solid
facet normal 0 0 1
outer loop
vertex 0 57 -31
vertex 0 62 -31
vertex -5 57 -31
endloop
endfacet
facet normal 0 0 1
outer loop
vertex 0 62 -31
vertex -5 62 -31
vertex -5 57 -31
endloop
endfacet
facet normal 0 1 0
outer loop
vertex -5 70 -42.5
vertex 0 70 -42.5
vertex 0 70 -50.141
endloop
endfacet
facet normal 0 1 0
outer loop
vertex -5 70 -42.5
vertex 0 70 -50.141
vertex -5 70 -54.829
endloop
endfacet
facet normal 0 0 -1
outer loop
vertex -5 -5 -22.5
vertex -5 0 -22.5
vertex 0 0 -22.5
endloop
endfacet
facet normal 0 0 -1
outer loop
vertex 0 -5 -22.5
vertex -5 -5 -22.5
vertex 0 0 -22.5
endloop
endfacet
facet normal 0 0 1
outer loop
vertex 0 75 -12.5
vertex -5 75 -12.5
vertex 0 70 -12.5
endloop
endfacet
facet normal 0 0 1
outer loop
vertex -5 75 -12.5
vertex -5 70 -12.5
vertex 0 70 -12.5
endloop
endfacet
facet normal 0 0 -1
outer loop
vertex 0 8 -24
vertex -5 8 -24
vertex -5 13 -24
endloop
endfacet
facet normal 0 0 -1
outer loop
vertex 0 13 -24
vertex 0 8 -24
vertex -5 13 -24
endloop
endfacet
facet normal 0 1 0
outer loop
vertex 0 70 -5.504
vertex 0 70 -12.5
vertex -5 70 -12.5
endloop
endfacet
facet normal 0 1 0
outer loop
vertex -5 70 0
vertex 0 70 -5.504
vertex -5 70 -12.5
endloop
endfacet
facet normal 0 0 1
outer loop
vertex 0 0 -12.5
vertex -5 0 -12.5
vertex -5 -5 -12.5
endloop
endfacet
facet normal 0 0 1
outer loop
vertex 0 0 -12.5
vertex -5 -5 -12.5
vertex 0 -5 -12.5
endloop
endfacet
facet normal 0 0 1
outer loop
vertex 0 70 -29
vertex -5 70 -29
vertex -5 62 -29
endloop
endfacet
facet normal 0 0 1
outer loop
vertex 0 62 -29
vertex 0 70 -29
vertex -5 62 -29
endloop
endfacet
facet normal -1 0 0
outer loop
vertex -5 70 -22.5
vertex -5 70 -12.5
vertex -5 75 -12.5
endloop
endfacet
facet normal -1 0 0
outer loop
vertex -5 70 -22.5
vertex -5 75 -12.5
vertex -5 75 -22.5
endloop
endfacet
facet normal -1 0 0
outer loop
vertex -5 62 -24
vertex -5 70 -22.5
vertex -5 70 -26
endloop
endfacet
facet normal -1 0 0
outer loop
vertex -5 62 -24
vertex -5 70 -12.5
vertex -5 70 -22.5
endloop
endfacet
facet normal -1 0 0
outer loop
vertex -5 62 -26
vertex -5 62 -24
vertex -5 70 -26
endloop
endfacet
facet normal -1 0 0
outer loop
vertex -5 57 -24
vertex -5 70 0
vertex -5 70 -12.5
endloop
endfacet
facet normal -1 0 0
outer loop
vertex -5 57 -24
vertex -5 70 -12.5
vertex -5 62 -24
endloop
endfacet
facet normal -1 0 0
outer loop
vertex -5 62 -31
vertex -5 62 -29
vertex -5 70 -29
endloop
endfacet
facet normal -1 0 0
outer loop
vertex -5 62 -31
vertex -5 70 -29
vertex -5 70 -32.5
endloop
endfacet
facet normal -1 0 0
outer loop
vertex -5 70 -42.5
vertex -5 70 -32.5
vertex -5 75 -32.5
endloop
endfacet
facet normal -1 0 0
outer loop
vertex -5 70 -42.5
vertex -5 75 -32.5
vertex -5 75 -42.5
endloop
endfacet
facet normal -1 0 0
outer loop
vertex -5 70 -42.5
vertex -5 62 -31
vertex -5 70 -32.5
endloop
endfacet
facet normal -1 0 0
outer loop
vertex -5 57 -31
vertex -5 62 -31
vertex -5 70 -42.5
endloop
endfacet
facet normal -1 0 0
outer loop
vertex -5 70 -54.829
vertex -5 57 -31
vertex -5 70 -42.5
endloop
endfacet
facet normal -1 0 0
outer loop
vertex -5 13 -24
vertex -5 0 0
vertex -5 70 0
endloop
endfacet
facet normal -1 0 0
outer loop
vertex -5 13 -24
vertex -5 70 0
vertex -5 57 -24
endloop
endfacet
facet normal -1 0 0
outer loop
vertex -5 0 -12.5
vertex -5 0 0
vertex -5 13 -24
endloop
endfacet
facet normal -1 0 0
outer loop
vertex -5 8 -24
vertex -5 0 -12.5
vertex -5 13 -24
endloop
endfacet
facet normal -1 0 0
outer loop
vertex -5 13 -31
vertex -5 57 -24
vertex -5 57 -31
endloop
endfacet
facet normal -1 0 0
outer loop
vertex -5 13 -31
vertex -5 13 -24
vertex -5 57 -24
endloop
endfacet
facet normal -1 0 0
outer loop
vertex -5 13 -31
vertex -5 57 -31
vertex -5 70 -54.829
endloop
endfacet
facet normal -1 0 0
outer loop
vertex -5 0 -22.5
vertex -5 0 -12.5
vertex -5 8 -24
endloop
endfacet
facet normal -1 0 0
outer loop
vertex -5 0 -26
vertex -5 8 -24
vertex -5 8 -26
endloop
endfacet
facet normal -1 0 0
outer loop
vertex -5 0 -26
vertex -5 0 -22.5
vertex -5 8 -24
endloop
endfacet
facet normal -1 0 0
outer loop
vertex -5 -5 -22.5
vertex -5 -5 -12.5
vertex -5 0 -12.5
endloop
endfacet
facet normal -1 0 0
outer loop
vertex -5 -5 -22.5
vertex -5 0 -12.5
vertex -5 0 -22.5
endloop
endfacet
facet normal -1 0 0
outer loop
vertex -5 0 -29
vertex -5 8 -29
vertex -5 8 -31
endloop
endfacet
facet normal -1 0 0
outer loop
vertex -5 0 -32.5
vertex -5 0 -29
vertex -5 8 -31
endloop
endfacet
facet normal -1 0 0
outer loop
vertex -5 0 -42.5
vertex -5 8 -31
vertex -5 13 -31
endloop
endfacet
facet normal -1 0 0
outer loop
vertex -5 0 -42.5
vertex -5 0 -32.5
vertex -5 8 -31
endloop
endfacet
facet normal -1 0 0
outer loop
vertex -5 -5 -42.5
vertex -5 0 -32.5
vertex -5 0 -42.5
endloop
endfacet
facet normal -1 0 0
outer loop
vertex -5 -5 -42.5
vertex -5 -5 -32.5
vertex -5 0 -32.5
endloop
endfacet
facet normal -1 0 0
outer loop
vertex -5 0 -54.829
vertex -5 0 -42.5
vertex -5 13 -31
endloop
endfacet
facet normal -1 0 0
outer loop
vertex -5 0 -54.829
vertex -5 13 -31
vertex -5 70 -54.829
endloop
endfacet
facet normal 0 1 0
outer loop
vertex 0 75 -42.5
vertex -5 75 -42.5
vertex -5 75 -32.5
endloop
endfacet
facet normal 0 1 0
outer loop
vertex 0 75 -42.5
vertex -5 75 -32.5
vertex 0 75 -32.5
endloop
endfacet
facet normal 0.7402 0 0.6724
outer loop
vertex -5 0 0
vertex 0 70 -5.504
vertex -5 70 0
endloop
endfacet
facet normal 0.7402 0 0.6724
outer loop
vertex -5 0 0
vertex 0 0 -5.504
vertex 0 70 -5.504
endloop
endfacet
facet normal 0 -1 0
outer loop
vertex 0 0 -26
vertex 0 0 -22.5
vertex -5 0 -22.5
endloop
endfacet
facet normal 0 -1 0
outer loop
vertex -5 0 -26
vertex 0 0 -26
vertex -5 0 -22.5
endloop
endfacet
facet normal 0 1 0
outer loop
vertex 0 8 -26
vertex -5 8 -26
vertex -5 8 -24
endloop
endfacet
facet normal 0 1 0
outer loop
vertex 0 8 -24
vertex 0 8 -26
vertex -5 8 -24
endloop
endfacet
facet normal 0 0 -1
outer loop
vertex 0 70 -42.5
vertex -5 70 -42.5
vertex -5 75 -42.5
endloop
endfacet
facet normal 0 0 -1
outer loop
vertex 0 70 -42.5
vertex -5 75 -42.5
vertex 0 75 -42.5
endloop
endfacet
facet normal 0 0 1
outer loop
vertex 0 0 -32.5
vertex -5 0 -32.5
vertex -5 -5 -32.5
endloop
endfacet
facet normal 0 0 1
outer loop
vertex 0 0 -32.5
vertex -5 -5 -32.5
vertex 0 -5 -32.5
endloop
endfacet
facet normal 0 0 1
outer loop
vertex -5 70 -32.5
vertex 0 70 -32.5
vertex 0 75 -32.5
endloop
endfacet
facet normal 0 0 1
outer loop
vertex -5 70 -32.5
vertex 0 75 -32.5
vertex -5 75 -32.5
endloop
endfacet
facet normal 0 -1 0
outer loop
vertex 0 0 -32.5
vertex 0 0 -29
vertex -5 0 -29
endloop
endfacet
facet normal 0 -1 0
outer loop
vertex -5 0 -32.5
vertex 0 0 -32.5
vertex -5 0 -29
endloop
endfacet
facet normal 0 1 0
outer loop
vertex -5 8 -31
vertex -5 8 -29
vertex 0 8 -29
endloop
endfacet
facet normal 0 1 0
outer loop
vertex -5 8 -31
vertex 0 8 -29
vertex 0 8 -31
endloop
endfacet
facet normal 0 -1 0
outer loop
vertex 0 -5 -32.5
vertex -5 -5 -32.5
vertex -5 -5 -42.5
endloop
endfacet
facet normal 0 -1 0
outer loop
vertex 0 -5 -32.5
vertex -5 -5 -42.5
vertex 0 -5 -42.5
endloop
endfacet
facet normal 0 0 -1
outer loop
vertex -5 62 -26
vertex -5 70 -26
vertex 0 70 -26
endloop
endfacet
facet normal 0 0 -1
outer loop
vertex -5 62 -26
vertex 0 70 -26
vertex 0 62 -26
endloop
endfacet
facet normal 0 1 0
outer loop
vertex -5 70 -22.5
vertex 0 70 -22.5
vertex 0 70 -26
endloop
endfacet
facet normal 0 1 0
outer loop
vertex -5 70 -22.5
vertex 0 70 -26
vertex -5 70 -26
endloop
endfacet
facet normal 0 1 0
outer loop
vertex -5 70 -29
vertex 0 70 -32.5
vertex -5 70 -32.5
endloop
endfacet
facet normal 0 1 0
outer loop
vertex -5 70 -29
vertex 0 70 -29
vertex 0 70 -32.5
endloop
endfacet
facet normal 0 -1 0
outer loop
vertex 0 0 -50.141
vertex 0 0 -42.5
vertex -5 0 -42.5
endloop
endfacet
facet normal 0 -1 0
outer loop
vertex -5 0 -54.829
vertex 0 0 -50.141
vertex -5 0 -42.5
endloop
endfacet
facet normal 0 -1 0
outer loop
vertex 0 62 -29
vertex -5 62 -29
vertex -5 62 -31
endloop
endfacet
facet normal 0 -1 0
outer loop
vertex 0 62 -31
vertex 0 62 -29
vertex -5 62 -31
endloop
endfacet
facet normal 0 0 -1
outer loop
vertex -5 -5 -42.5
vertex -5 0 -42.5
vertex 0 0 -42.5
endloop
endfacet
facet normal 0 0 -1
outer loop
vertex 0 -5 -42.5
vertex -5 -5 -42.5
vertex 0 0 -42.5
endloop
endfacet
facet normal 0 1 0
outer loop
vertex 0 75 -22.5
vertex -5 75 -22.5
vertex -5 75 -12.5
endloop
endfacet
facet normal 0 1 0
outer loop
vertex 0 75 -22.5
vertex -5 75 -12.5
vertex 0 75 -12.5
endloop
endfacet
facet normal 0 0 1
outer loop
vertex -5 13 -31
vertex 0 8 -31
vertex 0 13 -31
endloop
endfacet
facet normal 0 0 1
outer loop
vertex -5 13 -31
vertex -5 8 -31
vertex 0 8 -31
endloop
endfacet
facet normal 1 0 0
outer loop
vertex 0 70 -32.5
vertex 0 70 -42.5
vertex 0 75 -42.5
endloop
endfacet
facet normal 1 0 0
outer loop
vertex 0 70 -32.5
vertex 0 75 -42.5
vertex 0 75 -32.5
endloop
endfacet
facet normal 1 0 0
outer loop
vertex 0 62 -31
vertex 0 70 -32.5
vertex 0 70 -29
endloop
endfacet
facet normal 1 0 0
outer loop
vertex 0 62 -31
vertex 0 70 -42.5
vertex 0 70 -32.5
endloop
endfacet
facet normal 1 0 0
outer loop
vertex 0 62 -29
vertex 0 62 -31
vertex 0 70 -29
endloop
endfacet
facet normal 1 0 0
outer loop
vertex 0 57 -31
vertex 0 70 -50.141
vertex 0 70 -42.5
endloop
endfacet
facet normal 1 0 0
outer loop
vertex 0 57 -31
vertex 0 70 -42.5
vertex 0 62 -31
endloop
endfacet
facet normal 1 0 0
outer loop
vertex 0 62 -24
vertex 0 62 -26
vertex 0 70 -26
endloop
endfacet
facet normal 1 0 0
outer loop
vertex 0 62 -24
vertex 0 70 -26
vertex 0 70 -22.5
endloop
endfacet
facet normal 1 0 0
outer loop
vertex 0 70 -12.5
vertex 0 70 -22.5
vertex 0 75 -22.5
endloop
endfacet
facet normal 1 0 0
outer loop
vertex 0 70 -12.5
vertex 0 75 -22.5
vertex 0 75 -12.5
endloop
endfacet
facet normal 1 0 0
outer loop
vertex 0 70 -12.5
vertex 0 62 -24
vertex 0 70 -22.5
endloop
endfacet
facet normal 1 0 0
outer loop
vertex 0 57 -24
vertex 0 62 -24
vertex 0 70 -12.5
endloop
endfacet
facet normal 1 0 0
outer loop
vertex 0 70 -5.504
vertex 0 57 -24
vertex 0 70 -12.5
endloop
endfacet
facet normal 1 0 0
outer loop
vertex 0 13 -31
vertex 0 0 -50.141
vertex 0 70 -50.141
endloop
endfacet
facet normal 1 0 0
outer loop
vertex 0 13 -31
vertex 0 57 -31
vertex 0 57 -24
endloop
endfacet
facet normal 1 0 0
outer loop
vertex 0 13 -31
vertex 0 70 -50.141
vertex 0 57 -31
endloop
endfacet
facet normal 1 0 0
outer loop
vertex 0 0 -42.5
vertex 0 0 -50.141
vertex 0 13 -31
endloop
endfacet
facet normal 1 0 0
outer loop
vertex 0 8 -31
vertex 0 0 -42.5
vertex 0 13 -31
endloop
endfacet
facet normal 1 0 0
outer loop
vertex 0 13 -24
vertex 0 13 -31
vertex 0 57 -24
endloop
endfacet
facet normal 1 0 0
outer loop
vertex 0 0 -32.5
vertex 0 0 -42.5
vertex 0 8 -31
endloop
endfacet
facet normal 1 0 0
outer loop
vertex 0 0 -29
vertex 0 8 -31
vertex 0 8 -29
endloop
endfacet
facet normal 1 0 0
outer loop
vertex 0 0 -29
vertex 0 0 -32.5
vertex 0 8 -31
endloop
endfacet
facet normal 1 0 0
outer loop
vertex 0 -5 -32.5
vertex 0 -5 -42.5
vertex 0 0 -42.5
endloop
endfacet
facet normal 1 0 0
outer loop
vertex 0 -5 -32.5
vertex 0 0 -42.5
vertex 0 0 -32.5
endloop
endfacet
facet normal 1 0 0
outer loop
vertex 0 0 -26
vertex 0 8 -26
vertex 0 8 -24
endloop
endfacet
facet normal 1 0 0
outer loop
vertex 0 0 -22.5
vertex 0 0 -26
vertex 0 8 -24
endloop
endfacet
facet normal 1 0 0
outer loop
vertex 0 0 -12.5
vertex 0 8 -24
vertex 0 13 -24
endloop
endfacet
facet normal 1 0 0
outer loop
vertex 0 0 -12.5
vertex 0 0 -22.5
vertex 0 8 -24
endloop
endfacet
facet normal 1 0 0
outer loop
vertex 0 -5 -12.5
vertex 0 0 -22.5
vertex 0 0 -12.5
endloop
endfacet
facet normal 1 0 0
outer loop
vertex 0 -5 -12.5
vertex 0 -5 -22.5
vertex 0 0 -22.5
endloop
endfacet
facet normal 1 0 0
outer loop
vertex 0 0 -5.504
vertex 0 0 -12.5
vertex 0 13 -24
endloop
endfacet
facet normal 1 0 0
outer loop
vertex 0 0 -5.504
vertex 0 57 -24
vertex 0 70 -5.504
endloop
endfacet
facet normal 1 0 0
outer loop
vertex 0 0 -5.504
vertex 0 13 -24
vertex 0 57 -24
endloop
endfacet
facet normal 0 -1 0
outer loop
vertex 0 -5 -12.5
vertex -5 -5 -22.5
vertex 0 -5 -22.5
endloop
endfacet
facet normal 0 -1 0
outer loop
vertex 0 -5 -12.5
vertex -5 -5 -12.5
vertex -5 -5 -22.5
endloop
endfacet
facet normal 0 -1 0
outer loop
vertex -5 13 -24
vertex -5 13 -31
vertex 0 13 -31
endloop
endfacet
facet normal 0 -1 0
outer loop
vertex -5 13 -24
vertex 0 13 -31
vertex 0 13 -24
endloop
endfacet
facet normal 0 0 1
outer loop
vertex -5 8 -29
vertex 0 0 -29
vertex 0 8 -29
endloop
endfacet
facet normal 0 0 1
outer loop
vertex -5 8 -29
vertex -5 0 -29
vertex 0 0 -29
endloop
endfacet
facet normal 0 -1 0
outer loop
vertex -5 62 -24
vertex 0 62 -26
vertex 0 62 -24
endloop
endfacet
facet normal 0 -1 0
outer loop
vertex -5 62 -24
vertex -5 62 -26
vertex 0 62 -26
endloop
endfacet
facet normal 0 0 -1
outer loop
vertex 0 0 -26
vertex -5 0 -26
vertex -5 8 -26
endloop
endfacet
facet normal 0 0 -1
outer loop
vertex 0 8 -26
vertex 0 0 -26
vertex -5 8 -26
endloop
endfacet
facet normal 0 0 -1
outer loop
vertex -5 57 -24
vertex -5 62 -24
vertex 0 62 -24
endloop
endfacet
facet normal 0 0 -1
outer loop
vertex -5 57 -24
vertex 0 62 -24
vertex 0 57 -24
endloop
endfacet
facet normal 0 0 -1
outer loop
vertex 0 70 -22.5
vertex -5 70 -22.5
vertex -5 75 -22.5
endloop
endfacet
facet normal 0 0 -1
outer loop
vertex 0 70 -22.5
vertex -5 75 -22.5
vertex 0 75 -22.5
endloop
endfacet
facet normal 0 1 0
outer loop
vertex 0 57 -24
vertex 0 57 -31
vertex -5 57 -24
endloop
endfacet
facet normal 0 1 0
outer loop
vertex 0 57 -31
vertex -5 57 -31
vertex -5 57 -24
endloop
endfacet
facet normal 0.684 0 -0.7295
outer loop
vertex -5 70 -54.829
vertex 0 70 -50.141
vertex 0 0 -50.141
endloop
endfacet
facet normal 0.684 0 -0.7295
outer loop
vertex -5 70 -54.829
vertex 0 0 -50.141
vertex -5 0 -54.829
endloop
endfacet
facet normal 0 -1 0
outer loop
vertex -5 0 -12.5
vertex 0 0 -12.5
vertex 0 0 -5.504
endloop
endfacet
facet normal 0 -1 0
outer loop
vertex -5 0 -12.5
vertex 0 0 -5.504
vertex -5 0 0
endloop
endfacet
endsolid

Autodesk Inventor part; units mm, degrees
ref_plane "YZ Plane" through (0, 0, 0) normal (1, 0, 0) x (0, 1, 0)
ref_plane "XZ Plane" through (0, 0, 0) normal (0, 1, 0) x (-1, 0, 0)
ref_plane "XY Plane" through (0, 0, 0) normal (0, 0, 1) x (1, 0, 0)
sketch "Sketch2" plane through (0, 0, 0) normal (0, 1, 0) x (-1, 0, 0)
  line L0 (0, 0) -> (5, 0)
  line L1 (5, 0) -> (5, -54.829)
  line L2 (5, -54.829) -> (0, -54.829)
  line L3 (0, -54.829) -> (0, 0)
  dimension "d0" = 5
  dimension "d1" = 54.829
extrude "Extrusion1" add sketch "Sketch2" along normal blind 70
sketch "Sketch4" plane through (0, 70, 0) normal (0, 1, 0) x (1, 0, 0)
  line L0 (0, 0) -> (0, 54.829)
  line L1 (0, 54.829) -> (-5, 54.829)
  line L2 (-5, 54.829) -> (-5, 0)
  line L3 (-5, 0) -> (0, 0)
  line L4 (-5, 0) -> (-5, 12.5)
  line L5 (-5, 12.5) -> (0, 12.5)
  line L6 (-5, 12.5) -> (-5, 22.5)
  line L7 (-5, 22.5) -> (0, 22.5)
  line L8 (0, 22.5) -> (0, 32.5)
  line L9 (0, 32.5) -> (-5, 32.5)
  line L10 (-5, 32.5) -> (-5, 42.5)
  line L11 (-5, 42.5) -> (0, 42.5)
  dimension "d8" = 12.5
  dimension "d9" = 10
  dimension "d10" = 10
  dimension "d11" = 10
extrude "Extrusion2" add sketch "Sketch4" along normal blind 5 contours L5 L2 L7 L0 | L9 L2 L11 L0
sketch "Sketch5" plane through (0, 0, 0) normal (0, -1, 0) x (1, 0, 0)
  line L0 (-5, 0) -> (0, 0)
  line L1 (0, 0) -> (0, -54.829)
  line L2 (-5, 0) -> (-5, -12.5)
  line L3 (-5, -12.5) -> (0, -12.5)
  line L4 (-5, -12.5) -> (-5, -22.5)
  line L5 (-5, -22.5) -> (0, -22.5)
  line L6 (-5, -22.5) -> (-5, -32.5)
  line L7 (-5, -32.5) -> (0, -32.5)
  line L8 (-5, -32.5) -> (-5, -42.5)
  line L9 (-5, -42.5) -> (0, -42.5)
  line L10 (-5, -42.5) -> (-5, -54.829)
  line L11 (0, -54.829) -> (-5, -54.829)
  line L12 (0, 0) -> (0, -5.504)
  line L13 (0, -5.504) -> (-5, 0)
  line L14 (0, -54.829) -> (0, -50.141)
  line L15 (0, -50.141) -> (-5, -54.829)
  dimension "d20" = 10
  dimension "d21" = 10
  dimension "d22" = 10
  dimension "d23" = 12.5
  dimension "d24" = 54.829
  dimension "d25" = 12.329
  dimension "d28" = 5.504
  dimension "d29" = 4.688
extrude "Extrusion3" add sketch "Sketch5" along normal blind 5 contours L3 L1 L5 L4 | L7 L1 L9 L8
extrude "Extrusion4" cut sketch "Sketch5" against normal blind 70 contours L0 L1 L13 | L15 L1 L11
sketch "Sketch6" plane through (-5, 70, -12.5) normal (-1, 0, 0) x (0, 0, 1)
  line L0 (-13.5, -70) -> (-15, -70)
  line L1 (-15, -70) -> (-13.5, -70)
  line L2 (-13.5, -70) -> (-15, -70)
  line L3 (-15, -70) -> (-16.5, -70)
  line L4 (-16.5, -70) -> (-15, -70)
  line L5 (-13.5, -70) -> (-13.5, -62)
  line L6 (-13.5, -62) -> (-11.5, -62)
  line L7 (-11.5, -62) -> (-11.5, -57)
  line L8 (-13.5, -70) -> (-16.5, -70)
  line L9 (-16.5, -70) -> (-16.5, -62)
  line L10 (-16.5, -62) -> (-18.5, -62)
  line L11 (-18.5, -62) -> (-18.5, -57)
  line L12 (-18.5, -57) -> (-11.5, -57)
  line L13 (-13.5, 0) -> (-15, 0)
  line L14 (-15, 0) -> (-13.5, 0)
  line L15 (-13.5, 0) -> (-15, 0)
  line L16 (-15, 0) -> (-16.5, 0)
  line L17 (-16.5, 0) -> (-15, 0)
  line L18 (-13.5, 0) -> (-13.5, -8)
  line L19 (-13.5, -8) -> (-11.5, -8)
  line L20 (-11.5, -8) -> (-11.5, -13)
  line L21 (-13.5, 0) -> (-16.5, 0)
  line L22 (-16.5, 0) -> (-16.5, -8)
  line L23 (-16.5, -8) -> (-18.5, -8)
  line L24 (-18.5, -8) -> (-18.5, -13)
  line L25 (-18.5, -13) -> (-11.5, -13)
  point P0 (12.5, -70)
  dimension "d35" = 1.5
  dimension "d36" = 8
  dimension "d37" = 2
  dimension "d38" = 5
  dimension "d39" = 2
extrude "Extrusion5" cut sketch "Sketch6" against normal blind 5
properties part number "lateralnova"
